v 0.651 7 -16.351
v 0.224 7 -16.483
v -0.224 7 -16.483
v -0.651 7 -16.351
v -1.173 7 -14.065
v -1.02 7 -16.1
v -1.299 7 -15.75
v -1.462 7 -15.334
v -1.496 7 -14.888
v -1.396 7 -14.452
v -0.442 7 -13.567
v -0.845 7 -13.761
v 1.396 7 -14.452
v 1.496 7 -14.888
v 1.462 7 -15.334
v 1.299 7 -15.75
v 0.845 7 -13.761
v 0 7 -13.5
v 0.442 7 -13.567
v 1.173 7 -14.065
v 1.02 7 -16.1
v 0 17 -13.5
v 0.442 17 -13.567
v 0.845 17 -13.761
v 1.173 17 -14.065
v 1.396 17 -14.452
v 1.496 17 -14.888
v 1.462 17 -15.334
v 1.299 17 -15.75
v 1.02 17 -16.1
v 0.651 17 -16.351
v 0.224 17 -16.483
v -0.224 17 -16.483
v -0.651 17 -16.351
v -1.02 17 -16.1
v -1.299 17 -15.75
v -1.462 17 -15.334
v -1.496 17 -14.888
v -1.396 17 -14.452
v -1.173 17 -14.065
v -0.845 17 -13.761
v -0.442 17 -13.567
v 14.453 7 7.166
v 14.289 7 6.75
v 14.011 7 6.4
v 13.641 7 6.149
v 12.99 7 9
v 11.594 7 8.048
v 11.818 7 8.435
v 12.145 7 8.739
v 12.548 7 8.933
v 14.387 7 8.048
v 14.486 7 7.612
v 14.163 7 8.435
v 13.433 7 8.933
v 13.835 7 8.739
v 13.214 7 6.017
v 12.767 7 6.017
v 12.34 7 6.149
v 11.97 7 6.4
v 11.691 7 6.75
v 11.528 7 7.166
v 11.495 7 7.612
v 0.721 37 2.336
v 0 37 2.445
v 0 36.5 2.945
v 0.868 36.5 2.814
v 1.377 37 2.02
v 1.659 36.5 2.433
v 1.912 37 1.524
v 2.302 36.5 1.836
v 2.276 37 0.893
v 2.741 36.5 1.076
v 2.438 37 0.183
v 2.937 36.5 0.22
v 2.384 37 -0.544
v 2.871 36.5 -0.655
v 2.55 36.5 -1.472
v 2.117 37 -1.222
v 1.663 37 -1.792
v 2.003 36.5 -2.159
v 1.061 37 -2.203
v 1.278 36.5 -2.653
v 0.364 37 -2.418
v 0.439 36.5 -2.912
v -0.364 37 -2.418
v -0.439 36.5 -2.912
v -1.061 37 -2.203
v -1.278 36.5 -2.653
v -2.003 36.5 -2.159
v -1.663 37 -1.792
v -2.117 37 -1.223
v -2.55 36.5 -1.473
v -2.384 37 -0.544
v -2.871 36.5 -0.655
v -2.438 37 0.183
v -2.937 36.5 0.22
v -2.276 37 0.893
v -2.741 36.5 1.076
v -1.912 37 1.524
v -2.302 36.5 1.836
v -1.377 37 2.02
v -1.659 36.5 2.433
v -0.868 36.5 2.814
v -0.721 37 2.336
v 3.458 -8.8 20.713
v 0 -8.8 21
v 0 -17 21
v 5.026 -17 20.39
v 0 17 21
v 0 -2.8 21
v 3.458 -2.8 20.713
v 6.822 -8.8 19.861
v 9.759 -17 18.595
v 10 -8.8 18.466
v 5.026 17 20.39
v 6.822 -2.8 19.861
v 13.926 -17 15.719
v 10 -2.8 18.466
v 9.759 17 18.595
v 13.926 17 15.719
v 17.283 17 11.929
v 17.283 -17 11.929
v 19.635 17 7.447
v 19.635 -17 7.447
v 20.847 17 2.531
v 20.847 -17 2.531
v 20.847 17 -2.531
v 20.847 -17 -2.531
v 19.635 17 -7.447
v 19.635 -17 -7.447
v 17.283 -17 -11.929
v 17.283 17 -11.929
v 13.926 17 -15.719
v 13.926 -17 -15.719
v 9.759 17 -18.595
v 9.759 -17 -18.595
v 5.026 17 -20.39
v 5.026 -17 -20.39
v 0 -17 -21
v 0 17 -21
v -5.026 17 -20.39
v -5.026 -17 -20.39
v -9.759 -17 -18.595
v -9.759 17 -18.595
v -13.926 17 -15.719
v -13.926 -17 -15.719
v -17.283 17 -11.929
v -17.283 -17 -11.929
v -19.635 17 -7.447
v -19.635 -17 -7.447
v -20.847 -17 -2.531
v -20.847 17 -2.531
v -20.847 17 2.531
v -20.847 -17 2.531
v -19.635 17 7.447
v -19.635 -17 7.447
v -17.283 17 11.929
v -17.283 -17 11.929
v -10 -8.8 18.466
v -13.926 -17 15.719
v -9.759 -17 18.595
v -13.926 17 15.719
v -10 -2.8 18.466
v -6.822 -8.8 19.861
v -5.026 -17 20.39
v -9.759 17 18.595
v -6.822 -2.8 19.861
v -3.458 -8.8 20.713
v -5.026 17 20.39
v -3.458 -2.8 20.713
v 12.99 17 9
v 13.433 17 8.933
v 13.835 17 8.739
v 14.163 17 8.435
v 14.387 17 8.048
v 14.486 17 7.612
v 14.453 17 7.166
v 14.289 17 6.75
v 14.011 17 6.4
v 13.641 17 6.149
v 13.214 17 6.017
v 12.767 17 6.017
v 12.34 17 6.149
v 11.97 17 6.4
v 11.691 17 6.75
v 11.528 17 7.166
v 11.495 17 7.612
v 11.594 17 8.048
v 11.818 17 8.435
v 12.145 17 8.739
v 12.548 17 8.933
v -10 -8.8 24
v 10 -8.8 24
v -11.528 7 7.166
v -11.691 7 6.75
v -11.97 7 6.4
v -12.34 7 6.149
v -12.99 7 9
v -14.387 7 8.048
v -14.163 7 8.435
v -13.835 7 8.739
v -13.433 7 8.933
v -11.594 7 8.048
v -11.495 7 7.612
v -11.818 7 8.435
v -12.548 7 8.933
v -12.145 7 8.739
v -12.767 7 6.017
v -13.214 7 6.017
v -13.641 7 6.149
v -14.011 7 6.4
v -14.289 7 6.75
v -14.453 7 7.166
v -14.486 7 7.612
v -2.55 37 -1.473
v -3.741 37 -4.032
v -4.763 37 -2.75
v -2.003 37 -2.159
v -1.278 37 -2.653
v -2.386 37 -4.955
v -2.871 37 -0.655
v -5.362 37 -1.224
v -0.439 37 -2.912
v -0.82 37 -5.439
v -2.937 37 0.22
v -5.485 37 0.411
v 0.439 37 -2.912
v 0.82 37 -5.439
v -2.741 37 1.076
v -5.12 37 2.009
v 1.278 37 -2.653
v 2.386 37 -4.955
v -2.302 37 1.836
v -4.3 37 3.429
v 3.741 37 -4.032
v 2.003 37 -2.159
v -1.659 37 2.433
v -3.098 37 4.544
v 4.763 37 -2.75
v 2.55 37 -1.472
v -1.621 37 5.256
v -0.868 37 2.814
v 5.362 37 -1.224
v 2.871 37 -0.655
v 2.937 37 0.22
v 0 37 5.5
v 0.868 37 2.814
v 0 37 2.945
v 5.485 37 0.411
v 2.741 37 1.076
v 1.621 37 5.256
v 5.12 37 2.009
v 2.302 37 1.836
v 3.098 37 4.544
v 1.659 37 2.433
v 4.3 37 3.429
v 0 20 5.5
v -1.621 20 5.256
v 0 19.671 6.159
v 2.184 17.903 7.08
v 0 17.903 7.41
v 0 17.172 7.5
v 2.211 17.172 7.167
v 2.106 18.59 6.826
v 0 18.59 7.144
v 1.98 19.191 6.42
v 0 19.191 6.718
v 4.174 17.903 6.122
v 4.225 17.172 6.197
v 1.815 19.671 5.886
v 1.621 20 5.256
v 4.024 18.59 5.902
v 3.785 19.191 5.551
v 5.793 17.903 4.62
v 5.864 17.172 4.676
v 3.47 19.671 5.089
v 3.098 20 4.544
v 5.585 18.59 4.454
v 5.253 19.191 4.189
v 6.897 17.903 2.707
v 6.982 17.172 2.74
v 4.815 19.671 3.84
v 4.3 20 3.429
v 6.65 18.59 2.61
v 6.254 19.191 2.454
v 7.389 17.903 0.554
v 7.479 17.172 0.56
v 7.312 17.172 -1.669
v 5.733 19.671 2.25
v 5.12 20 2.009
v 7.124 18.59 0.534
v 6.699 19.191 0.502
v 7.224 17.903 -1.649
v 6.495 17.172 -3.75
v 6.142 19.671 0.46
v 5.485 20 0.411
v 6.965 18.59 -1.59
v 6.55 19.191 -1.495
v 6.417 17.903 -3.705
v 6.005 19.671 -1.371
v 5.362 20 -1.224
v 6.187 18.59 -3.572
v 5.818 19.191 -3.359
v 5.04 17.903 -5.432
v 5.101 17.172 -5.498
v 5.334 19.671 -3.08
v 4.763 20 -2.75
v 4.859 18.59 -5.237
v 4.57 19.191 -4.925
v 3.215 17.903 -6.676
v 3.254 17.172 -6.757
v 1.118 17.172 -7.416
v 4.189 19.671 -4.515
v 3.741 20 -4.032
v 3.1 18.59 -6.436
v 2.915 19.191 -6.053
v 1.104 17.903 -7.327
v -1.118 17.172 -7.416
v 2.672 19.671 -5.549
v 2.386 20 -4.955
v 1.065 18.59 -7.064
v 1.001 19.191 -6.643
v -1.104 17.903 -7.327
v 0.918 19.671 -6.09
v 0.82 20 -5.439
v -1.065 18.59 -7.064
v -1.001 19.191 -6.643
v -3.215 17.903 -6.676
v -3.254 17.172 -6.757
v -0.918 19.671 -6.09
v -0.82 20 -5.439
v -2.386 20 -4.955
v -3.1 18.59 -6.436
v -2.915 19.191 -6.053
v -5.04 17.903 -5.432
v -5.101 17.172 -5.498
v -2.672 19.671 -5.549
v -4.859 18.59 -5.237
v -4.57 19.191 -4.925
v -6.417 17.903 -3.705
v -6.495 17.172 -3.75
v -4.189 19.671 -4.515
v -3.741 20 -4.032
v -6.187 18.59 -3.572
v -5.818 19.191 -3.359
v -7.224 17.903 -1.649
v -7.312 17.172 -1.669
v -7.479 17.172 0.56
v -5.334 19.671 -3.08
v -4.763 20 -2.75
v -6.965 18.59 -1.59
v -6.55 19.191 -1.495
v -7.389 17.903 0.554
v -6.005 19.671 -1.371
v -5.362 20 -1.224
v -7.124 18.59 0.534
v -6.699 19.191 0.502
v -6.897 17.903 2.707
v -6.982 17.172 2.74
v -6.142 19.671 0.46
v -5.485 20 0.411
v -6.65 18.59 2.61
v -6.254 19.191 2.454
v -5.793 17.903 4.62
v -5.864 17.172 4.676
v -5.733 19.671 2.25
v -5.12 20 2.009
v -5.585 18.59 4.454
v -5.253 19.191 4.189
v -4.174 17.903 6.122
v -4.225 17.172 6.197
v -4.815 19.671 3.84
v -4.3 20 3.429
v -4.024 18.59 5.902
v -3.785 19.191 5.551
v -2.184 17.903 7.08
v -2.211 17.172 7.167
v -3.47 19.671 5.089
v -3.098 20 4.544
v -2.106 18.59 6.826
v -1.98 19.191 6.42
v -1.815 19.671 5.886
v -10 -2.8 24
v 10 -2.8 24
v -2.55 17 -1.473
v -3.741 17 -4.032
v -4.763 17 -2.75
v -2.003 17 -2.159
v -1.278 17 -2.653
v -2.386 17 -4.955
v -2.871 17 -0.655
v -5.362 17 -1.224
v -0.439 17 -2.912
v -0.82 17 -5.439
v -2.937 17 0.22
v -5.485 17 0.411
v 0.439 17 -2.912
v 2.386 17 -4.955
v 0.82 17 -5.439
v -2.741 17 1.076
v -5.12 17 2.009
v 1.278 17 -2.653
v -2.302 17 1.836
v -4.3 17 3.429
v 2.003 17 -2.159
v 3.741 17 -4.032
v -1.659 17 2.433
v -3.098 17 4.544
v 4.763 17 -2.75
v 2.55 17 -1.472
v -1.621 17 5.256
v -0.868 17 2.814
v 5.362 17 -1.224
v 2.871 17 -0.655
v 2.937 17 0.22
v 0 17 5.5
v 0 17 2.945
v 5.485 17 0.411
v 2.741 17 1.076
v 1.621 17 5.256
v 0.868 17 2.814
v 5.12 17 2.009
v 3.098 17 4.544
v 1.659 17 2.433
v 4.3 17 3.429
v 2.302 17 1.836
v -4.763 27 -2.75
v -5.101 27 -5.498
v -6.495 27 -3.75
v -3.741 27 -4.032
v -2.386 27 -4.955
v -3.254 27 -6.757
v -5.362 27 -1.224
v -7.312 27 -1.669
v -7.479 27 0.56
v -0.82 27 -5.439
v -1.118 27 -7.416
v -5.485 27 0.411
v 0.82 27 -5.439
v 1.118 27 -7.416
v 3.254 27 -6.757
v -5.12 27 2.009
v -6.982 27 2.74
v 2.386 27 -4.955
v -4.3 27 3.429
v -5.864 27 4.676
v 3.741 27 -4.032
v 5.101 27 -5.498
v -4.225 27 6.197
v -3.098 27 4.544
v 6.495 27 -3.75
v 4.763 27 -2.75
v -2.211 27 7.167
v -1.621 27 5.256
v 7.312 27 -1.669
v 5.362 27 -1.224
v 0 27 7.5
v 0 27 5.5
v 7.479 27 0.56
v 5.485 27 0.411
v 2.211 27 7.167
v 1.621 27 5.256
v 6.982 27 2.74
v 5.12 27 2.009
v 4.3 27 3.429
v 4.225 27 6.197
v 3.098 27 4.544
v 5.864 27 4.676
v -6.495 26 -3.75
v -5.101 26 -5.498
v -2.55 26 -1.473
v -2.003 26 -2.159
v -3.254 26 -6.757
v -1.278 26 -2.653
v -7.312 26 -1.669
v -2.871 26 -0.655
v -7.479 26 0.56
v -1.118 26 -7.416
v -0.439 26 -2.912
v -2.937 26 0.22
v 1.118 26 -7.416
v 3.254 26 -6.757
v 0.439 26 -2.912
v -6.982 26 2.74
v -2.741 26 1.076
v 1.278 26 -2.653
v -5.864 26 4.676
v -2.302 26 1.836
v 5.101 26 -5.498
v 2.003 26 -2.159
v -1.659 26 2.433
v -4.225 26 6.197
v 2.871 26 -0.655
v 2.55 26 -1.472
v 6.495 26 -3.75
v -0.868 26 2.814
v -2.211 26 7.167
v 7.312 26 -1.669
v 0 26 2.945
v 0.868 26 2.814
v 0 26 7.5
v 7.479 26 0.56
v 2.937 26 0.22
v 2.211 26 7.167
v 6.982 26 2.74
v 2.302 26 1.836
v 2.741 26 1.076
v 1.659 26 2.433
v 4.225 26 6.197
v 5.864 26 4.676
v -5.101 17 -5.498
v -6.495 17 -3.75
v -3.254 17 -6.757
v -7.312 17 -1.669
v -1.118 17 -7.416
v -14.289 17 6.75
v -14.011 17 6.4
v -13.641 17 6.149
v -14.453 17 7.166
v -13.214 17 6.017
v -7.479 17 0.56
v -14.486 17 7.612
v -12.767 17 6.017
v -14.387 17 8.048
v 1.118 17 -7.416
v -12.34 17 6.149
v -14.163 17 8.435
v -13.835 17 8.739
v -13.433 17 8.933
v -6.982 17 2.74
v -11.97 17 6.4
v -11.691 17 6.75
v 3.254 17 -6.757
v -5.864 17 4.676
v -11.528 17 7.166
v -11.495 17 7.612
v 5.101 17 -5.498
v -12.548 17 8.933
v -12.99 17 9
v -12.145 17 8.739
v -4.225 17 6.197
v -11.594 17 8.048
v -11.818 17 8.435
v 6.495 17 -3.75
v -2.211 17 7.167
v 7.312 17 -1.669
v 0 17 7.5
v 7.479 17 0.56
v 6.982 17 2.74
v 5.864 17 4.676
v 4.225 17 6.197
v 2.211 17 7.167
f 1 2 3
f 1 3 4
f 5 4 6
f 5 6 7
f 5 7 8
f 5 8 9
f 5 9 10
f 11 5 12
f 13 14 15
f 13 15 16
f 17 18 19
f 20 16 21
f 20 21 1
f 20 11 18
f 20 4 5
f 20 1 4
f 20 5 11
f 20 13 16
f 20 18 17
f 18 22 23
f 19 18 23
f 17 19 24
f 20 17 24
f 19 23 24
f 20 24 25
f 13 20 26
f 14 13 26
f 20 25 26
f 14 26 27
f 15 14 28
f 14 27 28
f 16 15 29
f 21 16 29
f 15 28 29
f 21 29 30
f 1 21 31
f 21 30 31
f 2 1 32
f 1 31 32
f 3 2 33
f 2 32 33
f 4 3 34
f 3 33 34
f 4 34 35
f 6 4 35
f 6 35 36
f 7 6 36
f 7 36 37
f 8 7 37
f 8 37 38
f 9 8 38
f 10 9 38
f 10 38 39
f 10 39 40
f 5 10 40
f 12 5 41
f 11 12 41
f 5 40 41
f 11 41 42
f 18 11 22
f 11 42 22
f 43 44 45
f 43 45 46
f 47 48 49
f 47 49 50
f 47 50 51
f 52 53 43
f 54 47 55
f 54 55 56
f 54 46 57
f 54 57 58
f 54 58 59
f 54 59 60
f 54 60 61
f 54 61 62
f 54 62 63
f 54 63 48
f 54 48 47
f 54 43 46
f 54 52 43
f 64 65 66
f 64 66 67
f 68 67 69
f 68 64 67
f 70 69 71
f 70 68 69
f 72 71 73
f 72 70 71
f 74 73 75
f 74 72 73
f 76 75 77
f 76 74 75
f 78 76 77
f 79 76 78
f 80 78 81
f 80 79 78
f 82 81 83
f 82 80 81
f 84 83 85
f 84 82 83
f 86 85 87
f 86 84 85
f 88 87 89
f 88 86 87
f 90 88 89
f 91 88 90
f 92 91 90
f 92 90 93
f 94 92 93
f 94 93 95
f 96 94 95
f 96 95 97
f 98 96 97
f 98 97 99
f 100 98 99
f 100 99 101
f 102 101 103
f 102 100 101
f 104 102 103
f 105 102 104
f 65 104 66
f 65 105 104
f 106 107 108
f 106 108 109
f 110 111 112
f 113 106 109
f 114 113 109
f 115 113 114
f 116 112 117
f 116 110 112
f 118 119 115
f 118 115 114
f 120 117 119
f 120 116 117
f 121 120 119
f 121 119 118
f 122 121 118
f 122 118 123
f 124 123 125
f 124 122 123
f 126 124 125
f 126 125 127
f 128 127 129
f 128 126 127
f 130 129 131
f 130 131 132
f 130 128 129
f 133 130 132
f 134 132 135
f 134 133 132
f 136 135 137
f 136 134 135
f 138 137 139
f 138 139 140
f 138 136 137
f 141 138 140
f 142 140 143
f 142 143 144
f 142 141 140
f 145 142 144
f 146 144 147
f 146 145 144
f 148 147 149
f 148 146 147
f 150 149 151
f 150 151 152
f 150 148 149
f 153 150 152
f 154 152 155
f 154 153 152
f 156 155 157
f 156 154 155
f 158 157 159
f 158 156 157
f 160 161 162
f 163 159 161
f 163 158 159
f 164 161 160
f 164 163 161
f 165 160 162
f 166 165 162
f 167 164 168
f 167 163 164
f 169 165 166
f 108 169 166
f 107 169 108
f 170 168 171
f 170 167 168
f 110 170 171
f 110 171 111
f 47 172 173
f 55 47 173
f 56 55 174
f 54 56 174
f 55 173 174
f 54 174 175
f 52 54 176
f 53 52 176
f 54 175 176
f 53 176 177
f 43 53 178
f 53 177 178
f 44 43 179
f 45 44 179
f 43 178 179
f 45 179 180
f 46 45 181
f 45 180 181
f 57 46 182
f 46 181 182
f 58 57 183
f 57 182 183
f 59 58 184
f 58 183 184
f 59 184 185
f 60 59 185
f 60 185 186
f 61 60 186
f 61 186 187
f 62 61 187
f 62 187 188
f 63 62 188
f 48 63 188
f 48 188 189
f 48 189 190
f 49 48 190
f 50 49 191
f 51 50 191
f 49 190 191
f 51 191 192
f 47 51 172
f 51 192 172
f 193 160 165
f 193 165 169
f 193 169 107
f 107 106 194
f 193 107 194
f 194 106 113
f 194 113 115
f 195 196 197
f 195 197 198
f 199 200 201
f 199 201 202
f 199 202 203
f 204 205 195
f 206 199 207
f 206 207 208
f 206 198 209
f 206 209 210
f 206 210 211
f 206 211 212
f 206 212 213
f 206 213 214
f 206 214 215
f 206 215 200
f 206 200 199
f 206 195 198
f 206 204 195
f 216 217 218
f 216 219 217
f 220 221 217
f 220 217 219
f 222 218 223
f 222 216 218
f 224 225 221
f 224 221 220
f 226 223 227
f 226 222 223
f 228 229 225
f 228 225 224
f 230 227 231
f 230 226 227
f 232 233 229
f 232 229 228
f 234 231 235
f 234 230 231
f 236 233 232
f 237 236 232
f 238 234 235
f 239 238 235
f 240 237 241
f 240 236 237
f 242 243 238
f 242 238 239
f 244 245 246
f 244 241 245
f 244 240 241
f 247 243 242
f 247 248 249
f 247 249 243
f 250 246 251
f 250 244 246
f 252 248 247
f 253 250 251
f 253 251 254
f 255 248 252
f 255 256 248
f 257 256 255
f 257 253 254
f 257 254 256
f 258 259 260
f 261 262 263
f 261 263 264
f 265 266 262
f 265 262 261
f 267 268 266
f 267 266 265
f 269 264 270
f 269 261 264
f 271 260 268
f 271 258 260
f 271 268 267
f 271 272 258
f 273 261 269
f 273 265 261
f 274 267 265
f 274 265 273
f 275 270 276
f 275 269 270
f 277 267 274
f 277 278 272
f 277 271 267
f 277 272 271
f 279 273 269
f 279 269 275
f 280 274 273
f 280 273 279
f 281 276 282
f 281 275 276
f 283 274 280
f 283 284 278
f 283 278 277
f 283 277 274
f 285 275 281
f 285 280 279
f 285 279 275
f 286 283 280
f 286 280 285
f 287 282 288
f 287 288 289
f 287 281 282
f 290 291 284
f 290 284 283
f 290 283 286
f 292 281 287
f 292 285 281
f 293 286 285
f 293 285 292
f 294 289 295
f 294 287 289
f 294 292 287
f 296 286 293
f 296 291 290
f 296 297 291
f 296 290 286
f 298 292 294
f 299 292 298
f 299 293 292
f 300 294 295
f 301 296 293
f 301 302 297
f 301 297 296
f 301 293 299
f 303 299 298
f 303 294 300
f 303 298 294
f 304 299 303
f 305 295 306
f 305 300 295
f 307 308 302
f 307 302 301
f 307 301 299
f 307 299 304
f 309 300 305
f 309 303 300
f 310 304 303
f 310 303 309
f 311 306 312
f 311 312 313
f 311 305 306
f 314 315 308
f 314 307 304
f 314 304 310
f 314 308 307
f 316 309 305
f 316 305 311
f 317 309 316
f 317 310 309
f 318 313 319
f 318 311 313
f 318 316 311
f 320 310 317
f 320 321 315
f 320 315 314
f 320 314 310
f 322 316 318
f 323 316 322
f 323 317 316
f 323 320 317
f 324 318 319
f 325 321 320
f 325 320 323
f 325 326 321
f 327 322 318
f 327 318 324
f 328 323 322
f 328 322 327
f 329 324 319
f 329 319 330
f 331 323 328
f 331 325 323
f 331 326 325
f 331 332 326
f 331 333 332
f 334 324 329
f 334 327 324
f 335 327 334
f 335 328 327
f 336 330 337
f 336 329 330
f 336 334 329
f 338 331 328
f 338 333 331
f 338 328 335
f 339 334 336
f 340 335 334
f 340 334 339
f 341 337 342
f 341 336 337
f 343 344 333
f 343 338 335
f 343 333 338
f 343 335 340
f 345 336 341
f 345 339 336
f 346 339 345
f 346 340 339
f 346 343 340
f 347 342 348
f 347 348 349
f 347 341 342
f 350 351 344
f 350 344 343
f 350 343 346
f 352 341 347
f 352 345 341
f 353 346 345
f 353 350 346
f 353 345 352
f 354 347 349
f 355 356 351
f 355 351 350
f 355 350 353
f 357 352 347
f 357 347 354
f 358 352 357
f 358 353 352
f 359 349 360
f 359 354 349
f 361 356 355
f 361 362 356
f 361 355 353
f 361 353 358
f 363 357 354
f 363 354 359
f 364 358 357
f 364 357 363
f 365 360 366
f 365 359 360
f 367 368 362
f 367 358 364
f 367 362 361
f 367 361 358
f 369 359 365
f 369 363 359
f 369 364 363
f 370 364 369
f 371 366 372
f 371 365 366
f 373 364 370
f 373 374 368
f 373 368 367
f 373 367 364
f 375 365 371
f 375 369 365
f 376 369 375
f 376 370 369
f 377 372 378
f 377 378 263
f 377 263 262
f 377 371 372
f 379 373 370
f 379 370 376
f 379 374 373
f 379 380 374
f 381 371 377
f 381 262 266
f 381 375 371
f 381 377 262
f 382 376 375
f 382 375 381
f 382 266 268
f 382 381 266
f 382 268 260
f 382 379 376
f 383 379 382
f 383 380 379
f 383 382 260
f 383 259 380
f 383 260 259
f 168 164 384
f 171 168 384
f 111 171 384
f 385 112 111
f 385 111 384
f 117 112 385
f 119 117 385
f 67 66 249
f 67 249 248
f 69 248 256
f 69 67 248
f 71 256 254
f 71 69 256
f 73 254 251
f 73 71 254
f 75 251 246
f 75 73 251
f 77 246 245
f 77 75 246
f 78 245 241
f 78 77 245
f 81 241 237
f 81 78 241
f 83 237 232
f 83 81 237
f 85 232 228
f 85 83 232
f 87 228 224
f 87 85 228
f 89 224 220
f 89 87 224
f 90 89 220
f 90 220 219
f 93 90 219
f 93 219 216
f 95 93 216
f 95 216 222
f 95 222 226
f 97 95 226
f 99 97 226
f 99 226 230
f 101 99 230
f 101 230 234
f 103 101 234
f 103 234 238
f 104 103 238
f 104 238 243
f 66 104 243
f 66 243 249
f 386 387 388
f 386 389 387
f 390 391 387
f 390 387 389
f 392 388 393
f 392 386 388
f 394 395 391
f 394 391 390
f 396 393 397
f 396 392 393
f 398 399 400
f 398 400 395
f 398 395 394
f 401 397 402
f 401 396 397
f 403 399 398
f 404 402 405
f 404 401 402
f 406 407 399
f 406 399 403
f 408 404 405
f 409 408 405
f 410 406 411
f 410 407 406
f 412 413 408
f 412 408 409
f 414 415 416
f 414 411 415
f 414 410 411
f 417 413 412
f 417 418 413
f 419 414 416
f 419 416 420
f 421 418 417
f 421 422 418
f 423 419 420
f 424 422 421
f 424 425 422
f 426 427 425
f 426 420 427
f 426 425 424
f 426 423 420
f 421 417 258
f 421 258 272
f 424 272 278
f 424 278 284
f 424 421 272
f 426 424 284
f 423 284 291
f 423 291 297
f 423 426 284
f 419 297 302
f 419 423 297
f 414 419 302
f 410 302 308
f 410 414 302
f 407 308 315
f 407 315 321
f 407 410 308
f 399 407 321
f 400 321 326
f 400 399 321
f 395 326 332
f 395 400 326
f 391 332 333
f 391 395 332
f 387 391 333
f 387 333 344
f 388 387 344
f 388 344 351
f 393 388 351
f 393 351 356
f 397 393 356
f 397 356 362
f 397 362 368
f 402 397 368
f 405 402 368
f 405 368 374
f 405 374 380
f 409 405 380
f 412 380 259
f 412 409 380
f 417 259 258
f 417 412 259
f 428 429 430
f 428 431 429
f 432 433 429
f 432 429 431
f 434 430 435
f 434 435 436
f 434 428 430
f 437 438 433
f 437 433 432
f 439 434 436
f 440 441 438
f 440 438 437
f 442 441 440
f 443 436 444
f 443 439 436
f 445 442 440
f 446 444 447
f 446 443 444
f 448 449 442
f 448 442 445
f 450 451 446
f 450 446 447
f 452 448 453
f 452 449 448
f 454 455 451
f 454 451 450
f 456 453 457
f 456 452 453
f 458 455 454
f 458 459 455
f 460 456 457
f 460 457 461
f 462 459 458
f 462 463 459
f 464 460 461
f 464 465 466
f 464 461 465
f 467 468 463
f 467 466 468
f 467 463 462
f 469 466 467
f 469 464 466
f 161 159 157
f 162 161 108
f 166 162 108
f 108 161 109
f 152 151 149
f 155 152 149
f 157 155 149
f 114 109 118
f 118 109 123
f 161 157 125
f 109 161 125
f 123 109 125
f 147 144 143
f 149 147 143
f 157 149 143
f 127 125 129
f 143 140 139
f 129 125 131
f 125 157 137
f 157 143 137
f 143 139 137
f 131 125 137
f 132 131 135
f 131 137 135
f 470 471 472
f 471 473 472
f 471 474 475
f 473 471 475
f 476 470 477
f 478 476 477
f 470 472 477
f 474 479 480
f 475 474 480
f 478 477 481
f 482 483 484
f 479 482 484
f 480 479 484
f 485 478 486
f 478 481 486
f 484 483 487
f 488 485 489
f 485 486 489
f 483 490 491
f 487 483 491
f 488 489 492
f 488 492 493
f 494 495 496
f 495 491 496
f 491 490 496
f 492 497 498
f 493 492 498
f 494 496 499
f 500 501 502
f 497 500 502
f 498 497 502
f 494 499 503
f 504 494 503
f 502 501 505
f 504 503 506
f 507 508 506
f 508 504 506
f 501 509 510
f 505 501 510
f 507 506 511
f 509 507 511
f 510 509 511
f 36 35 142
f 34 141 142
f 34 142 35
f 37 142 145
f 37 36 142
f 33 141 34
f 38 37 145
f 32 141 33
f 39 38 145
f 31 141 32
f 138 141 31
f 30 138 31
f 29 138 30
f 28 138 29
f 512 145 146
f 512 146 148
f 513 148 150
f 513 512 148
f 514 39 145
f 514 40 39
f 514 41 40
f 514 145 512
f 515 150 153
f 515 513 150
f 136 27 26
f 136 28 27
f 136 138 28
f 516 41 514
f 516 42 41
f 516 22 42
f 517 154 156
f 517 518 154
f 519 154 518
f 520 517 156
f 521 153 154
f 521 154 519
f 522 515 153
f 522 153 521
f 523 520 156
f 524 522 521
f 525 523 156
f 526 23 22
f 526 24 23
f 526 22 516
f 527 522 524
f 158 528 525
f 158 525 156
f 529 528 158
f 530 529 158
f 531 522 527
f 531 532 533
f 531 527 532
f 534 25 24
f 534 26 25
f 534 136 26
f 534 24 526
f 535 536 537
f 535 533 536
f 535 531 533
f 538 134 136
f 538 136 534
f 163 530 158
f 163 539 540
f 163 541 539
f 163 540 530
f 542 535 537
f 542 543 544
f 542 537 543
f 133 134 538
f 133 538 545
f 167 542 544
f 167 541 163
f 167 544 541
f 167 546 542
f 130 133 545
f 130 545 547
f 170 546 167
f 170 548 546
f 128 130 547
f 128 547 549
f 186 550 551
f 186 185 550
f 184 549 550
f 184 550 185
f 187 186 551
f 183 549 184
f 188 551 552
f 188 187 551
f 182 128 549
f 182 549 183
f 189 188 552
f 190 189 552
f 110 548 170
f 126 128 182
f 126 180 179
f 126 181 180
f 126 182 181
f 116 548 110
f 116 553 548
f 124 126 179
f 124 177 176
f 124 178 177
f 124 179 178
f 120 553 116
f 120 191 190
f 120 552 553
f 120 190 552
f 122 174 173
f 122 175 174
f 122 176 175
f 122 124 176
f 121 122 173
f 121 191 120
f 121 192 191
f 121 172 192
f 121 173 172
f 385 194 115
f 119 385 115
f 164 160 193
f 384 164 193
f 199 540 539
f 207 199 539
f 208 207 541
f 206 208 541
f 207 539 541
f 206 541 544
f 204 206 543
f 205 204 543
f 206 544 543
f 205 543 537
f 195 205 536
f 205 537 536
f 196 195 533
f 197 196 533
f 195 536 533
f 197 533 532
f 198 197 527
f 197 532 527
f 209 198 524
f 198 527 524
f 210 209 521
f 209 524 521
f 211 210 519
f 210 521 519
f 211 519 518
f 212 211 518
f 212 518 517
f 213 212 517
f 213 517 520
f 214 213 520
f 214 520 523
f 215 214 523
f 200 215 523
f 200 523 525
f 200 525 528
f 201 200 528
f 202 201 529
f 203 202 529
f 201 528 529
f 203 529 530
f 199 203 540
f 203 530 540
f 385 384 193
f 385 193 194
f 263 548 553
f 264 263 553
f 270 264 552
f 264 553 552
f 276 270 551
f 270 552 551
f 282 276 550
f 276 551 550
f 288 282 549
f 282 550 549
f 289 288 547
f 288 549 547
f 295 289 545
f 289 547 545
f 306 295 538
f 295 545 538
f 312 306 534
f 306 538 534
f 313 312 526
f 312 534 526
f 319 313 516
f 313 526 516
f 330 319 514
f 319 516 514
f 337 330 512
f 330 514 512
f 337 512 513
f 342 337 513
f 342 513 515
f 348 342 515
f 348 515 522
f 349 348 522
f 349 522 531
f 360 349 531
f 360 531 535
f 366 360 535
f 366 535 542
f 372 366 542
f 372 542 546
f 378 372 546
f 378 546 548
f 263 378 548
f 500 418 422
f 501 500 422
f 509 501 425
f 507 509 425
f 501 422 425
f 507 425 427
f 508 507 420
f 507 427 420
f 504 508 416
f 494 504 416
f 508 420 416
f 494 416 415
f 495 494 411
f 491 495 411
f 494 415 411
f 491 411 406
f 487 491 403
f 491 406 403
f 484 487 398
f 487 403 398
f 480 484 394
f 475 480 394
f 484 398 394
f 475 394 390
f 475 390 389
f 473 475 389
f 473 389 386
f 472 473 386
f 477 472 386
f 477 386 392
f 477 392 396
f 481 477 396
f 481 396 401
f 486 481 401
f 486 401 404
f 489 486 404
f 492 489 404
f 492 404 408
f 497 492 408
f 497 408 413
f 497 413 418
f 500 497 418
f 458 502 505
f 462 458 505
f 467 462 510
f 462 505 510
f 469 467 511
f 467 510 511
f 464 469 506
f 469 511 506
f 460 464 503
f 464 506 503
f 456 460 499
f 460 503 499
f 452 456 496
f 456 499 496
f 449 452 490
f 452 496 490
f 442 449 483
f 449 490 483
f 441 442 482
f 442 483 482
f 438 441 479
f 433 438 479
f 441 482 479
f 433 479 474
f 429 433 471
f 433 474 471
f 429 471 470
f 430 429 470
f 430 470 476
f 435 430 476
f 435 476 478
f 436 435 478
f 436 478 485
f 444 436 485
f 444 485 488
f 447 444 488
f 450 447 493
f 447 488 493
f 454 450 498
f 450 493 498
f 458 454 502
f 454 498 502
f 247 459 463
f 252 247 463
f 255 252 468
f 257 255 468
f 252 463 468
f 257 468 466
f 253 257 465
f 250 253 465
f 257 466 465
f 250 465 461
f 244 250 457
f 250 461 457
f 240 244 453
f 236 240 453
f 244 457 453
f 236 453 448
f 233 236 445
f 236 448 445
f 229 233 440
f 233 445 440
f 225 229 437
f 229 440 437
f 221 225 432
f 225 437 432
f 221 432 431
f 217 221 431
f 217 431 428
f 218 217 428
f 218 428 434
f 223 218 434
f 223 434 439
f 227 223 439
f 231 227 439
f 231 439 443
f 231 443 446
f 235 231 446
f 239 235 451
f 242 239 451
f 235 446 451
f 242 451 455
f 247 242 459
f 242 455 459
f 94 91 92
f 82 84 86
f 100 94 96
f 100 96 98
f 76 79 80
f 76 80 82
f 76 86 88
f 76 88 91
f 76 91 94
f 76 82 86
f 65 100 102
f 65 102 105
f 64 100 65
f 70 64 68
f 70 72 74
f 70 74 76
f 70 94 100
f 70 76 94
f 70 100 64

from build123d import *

# Parameters (mm, degrees)
SKETCH1_R           = 21
SKETCH1_R_2         = 1.5
SKETCH1_R_3         = 7.5
SKETCH1_R_4         = 5.5
SKETCH1_R_5         = 2.945
BOSS_EXTRUDE1_DEPTH = 17
CUT_EXTRUDE1_START  = 17
SKETCH1_3_R         = 1.5
CUT_EXTRUDE1_DEPTH  = 10
BOSS_EXTRUDE2_START = 17
SKETCH1_4_R         = 7.5
SKETCH1_4_R_2       = 5.5
BOSS_EXTRUDE2_DEPTH = 3
FILLET1_R           = 3
BOSS_EXTRUDE3_START = 17
SKETCH1_5_R         = 2.945
BOSS_EXTRUDE3_DEPTH = 20
BOSS_EXTRUDE4_START = -2.8
BOSS_EXTRUDE4_DEPTH = 6
CHAMFER1_SIZE       = 0.5
BOSS_EXTRUDE6_START = 27
SKETCH1_10_R        = 5.5
SKETCH1_10_R_2      = 2.945
BOSS_EXTRUDE6_DEPTH = 10
BOSS_EXTRUDE7_START = 26
SKETCH1_12_R        = 7.5
SKETCH1_12_R_2      = 5.5
SKETCH1_12_R_3      = 2.945
BOSS_EXTRUDE7_DEPTH = 1


with BuildPart() as part:
    # Sketch1 → Boss-Extrude1 (new, symmetric)
    # profile 1 of 7: a face of its own
    with BuildSketch(Plane(origin=(0, 0, 0), x_dir=(1, 0, 0), z_dir=(0, 1, 0))):
        with Locations(Location((0, 0, 0), (0, 0, 270))):
            Circle(SKETCH1_R)
        with Locations((12.990381057, -7.5)):
            Circle(SKETCH1_R_2, mode=Mode.SUBTRACT)
        with Locations((-12.990381057, -7.5)):
            Circle(SKETCH1_R_2, mode=Mode.SUBTRACT)
        with Locations((0, 15)):
            Circle(SKETCH1_R_2, mode=Mode.SUBTRACT)
        Circle(SKETCH1_R_3, mode=Mode.SUBTRACT)
    # profile 2 of 7: a face of its own
    with BuildSketch(Plane(origin=(0, 0, 0), x_dir=(1, 0, 0), z_dir=(0, 1, 0))):
        Circle(SKETCH1_R_3)
        Circle(SKETCH1_R_4, mode=Mode.SUBTRACT)
    # profile 3 of 7: a face of its own
    with BuildSketch(Plane(origin=(0, 0, 0), x_dir=(1, 0, 0), z_dir=(0, 1, 0))):
        Circle(SKETCH1_R_4)
        Circle(SKETCH1_R_5, mode=Mode.SUBTRACT)
    # profile 4 of 7: a face of its own
    with BuildSketch(Plane(origin=(0, 0, 0), x_dir=(1, 0, 0), z_dir=(0, 1, 0))):
        Circle(SKETCH1_R_5)
    # profile 5 of 7: a face of its own
    with BuildSketch(Plane(origin=(0, 0, 0), x_dir=(1, 0, 0), z_dir=(0, 1, 0))):
        with Locations((-12.990381057, -7.5)):
            Circle(SKETCH1_R_2)
    # profile 6 of 7: a face of its own
    with BuildSketch(Plane(origin=(0, 0, 0), x_dir=(1, 0, 0), z_dir=(0, 1, 0))):
        with Locations((12.990381057, -7.5)):
            Circle(SKETCH1_R_2)
    # profile 7 of 7: a face of its own
    with BuildSketch(Plane(origin=(0, 0, 0), x_dir=(1, 0, 0), z_dir=(0, 1, 0))):
        with Locations((0, 15)):
            Circle(SKETCH1_R_2)
    extrude(amount=BOSS_EXTRUDE1_DEPTH, both=True)

    # Sketch1<3> → Cut-Extrude1 (cut)
    with BuildSketch(Plane(origin=(0, 0, 0), x_dir=(1, 0, 0), z_dir=(0, 1, 0)).offset(CUT_EXTRUDE1_START)):
        with Locations(Location((-12.990381057, -7.5, 0), (0, 0, 270))):
            Circle(SKETCH1_3_R)
        with Locations(Location((12.990381057, -7.5, 0), (0, 0, 270))):
            Circle(SKETCH1_3_R)
        with Locations(Location((0, 15, 0), (0, 0, 270))):
            Circle(SKETCH1_3_R)
    extrude(amount=-CUT_EXTRUDE1_DEPTH, mode=Mode.SUBTRACT)

    # Sketch1<4> → Boss-Extrude2 (add)
    with BuildSketch(Plane(origin=(0, 0, 0), x_dir=(1, 0, 0), z_dir=(0, 1, 0)).offset(BOSS_EXTRUDE2_START)):
        with Locations(Location((0, 0, 0), (0, 0, 270))):
            Circle(SKETCH1_4_R)
        with Locations(Location((0, 0, 0), (0, 0, 270))):
            Circle(SKETCH1_4_R_2, mode=Mode.SUBTRACT)
    extrude(amount=BOSS_EXTRUDE2_DEPTH)

    # Fillet1
    # the kernel refuses this fillet: 3 mm, written as the material it takes off along each edge
    with BuildSketch(Plane(origin=(0, 20, 0), x_dir=(0, 0, 1), z_dir=(-1, 0, 0))) as fillet1_piece_1:
        with BuildLine():
            CenterArc((4.5, -2.828427125), FILLET1_R, 0, 70.528779366)
            Line((5.5, 0), (5.52, 0.056568542))
            ThreePointArc((5.52, 0.056568542), (6.5, 0.06), (7.5, 0.06))
            Line((7.5, 0.06), (7.56, 0))
            Line((7.56, 0), (7.56, -2.828427125))
            Line((7.56, -2.828427125), (7.5, -2.828427125))
        make_face()
    revolve(axis=Axis((0, 20, 0), (0, 1, 0)), mode=Mode.SUBTRACT)

    # Sketch1<5> → Boss-Extrude3 (add)
    with BuildSketch(Plane(origin=(0, 0, 0), x_dir=(1, 0, 0), z_dir=(0, 1, 0)).offset(BOSS_EXTRUDE3_START)):
        with Locations(Location((0, 0, 0), (0, 0, 270))):
            Circle(SKETCH1_5_R)
    extrude(amount=BOSS_EXTRUDE3_DEPTH)

    # Sketch1<8> → Boss-Extrude4 (add)
    with BuildSketch(Plane(origin=(0, 0, 0), x_dir=(1, 0, 0), z_dir=(0, 1, 0)).offset(BOSS_EXTRUDE4_START)):
        with BuildLine():
            ThreePointArc((10, -18.466185313), (0, -21), (-10, -18.466185313))
            Line((-10, -18.466185313), (-10, -24))
            Line((-10, -24), (10, -24))
            Line((10, -24), (10, -18.466185313))
        make_face()
    extrude(amount=-BOSS_EXTRUDE4_DEPTH)

    # Chamfer1
    chamfer1_edges = [part.edges().sort_by_distance(p)[0] for p in [
        (0, 37, -2.945),
    ]]
    chamfer(chamfer1_edges, length=CHAMFER1_SIZE)

    # Sketch1<10> → Boss-Extrude6 (add)
    with BuildSketch(Plane(origin=(0, 0, 0), x_dir=(1, 0, 0), z_dir=(0, 1, 0)).offset(BOSS_EXTRUDE6_START)):
        with Locations(Location((0, 0, 0), (0, 0, 270))):
            Circle(SKETCH1_10_R)
        with Locations(Location((0, 0, 0), (0, 0, 270))):
            Circle(SKETCH1_10_R_2, mode=Mode.SUBTRACT)
    extrude(amount=BOSS_EXTRUDE6_DEPTH)

    # Sketch1<12> → Boss-Extrude7 (add)
    # profile 1 of 2: a face of its own
    with BuildSketch(Plane(origin=(0, 0, 0), x_dir=(1, 0, 0), z_dir=(0, 1, 0)).offset(BOSS_EXTRUDE7_START)):
        with Locations(Location((0, 0, 0), (0, 0, 270))):
            Circle(SKETCH1_12_R)
        with Locations(Location((0, 0, 0), (0, 0, 270))):
            Circle(SKETCH1_12_R_2, mode=Mode.SUBTRACT)
    # profile 2 of 2: a face of its own
    with BuildSketch(Plane(origin=(0, 0, 0), x_dir=(1, 0, 0), z_dir=(0, 1, 0)).offset(BOSS_EXTRUDE7_START)):
        with Locations(Location((0, 0, 0), (0, 0, 270))):
            Circle(SKETCH1_12_R_2)
        with Locations(Location((0, 0, 0), (0, 0, 270))):
            Circle(SKETCH1_12_R_3, mode=Mode.SUBTRACT)
    extrude(amount=BOSS_EXTRUDE7_DEPTH)


solid = part.part
